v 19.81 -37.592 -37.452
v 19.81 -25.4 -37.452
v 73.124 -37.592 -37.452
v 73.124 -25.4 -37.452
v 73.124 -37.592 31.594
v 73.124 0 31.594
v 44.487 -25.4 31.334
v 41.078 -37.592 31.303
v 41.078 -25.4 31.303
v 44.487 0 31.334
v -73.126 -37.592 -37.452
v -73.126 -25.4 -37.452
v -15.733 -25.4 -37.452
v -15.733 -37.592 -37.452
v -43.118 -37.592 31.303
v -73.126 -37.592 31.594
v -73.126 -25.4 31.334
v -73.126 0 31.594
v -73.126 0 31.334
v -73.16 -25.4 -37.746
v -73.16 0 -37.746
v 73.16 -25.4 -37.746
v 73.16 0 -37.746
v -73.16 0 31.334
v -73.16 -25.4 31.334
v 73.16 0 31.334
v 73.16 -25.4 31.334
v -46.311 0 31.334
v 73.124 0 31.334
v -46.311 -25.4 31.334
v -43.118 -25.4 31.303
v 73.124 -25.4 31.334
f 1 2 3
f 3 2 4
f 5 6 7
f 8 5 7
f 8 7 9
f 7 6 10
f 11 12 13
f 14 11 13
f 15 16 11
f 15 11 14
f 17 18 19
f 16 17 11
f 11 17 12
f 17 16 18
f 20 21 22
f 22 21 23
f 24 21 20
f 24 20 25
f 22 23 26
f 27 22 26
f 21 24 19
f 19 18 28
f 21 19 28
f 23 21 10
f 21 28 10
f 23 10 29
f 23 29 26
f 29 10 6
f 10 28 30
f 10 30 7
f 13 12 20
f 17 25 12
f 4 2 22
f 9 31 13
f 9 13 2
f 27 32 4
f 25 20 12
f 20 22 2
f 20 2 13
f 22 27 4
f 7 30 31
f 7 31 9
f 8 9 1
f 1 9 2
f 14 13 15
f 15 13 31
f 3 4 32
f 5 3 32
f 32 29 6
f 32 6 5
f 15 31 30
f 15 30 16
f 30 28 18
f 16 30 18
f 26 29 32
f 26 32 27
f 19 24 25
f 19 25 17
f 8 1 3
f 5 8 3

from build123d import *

# Parameters (mm, degrees)
F0_W     = 146.320656
F0_H     = 69.079675
F2_DEPTH = 25.4
F3_DEPTH = 37.592


with BuildPart() as f2:
    # F0 (on Front) → F2 (new body)
    with BuildSketch(Plane.XZ):
        with Locations((0, -3.206231)):
            Rectangle(F0_W, F0_H)
    extrude(amount=F2_DEPTH)

    # F1 (on Front) → F3 (join)
    with BuildSketch(Plane.XZ):
        Polygon((-43.118302, 31.302609), (-73.125824, 31.593941), (-73.125824, -37.452485), (-15.732799, -37.452485), align=None)
        Polygon((73.124416, -37.452485), (73.124416, 31.593941), (41.077554, 31.302609), (19.810088, -37.452485), align=None)
    extrude(amount=F3_DEPTH)


solid = f2.part
